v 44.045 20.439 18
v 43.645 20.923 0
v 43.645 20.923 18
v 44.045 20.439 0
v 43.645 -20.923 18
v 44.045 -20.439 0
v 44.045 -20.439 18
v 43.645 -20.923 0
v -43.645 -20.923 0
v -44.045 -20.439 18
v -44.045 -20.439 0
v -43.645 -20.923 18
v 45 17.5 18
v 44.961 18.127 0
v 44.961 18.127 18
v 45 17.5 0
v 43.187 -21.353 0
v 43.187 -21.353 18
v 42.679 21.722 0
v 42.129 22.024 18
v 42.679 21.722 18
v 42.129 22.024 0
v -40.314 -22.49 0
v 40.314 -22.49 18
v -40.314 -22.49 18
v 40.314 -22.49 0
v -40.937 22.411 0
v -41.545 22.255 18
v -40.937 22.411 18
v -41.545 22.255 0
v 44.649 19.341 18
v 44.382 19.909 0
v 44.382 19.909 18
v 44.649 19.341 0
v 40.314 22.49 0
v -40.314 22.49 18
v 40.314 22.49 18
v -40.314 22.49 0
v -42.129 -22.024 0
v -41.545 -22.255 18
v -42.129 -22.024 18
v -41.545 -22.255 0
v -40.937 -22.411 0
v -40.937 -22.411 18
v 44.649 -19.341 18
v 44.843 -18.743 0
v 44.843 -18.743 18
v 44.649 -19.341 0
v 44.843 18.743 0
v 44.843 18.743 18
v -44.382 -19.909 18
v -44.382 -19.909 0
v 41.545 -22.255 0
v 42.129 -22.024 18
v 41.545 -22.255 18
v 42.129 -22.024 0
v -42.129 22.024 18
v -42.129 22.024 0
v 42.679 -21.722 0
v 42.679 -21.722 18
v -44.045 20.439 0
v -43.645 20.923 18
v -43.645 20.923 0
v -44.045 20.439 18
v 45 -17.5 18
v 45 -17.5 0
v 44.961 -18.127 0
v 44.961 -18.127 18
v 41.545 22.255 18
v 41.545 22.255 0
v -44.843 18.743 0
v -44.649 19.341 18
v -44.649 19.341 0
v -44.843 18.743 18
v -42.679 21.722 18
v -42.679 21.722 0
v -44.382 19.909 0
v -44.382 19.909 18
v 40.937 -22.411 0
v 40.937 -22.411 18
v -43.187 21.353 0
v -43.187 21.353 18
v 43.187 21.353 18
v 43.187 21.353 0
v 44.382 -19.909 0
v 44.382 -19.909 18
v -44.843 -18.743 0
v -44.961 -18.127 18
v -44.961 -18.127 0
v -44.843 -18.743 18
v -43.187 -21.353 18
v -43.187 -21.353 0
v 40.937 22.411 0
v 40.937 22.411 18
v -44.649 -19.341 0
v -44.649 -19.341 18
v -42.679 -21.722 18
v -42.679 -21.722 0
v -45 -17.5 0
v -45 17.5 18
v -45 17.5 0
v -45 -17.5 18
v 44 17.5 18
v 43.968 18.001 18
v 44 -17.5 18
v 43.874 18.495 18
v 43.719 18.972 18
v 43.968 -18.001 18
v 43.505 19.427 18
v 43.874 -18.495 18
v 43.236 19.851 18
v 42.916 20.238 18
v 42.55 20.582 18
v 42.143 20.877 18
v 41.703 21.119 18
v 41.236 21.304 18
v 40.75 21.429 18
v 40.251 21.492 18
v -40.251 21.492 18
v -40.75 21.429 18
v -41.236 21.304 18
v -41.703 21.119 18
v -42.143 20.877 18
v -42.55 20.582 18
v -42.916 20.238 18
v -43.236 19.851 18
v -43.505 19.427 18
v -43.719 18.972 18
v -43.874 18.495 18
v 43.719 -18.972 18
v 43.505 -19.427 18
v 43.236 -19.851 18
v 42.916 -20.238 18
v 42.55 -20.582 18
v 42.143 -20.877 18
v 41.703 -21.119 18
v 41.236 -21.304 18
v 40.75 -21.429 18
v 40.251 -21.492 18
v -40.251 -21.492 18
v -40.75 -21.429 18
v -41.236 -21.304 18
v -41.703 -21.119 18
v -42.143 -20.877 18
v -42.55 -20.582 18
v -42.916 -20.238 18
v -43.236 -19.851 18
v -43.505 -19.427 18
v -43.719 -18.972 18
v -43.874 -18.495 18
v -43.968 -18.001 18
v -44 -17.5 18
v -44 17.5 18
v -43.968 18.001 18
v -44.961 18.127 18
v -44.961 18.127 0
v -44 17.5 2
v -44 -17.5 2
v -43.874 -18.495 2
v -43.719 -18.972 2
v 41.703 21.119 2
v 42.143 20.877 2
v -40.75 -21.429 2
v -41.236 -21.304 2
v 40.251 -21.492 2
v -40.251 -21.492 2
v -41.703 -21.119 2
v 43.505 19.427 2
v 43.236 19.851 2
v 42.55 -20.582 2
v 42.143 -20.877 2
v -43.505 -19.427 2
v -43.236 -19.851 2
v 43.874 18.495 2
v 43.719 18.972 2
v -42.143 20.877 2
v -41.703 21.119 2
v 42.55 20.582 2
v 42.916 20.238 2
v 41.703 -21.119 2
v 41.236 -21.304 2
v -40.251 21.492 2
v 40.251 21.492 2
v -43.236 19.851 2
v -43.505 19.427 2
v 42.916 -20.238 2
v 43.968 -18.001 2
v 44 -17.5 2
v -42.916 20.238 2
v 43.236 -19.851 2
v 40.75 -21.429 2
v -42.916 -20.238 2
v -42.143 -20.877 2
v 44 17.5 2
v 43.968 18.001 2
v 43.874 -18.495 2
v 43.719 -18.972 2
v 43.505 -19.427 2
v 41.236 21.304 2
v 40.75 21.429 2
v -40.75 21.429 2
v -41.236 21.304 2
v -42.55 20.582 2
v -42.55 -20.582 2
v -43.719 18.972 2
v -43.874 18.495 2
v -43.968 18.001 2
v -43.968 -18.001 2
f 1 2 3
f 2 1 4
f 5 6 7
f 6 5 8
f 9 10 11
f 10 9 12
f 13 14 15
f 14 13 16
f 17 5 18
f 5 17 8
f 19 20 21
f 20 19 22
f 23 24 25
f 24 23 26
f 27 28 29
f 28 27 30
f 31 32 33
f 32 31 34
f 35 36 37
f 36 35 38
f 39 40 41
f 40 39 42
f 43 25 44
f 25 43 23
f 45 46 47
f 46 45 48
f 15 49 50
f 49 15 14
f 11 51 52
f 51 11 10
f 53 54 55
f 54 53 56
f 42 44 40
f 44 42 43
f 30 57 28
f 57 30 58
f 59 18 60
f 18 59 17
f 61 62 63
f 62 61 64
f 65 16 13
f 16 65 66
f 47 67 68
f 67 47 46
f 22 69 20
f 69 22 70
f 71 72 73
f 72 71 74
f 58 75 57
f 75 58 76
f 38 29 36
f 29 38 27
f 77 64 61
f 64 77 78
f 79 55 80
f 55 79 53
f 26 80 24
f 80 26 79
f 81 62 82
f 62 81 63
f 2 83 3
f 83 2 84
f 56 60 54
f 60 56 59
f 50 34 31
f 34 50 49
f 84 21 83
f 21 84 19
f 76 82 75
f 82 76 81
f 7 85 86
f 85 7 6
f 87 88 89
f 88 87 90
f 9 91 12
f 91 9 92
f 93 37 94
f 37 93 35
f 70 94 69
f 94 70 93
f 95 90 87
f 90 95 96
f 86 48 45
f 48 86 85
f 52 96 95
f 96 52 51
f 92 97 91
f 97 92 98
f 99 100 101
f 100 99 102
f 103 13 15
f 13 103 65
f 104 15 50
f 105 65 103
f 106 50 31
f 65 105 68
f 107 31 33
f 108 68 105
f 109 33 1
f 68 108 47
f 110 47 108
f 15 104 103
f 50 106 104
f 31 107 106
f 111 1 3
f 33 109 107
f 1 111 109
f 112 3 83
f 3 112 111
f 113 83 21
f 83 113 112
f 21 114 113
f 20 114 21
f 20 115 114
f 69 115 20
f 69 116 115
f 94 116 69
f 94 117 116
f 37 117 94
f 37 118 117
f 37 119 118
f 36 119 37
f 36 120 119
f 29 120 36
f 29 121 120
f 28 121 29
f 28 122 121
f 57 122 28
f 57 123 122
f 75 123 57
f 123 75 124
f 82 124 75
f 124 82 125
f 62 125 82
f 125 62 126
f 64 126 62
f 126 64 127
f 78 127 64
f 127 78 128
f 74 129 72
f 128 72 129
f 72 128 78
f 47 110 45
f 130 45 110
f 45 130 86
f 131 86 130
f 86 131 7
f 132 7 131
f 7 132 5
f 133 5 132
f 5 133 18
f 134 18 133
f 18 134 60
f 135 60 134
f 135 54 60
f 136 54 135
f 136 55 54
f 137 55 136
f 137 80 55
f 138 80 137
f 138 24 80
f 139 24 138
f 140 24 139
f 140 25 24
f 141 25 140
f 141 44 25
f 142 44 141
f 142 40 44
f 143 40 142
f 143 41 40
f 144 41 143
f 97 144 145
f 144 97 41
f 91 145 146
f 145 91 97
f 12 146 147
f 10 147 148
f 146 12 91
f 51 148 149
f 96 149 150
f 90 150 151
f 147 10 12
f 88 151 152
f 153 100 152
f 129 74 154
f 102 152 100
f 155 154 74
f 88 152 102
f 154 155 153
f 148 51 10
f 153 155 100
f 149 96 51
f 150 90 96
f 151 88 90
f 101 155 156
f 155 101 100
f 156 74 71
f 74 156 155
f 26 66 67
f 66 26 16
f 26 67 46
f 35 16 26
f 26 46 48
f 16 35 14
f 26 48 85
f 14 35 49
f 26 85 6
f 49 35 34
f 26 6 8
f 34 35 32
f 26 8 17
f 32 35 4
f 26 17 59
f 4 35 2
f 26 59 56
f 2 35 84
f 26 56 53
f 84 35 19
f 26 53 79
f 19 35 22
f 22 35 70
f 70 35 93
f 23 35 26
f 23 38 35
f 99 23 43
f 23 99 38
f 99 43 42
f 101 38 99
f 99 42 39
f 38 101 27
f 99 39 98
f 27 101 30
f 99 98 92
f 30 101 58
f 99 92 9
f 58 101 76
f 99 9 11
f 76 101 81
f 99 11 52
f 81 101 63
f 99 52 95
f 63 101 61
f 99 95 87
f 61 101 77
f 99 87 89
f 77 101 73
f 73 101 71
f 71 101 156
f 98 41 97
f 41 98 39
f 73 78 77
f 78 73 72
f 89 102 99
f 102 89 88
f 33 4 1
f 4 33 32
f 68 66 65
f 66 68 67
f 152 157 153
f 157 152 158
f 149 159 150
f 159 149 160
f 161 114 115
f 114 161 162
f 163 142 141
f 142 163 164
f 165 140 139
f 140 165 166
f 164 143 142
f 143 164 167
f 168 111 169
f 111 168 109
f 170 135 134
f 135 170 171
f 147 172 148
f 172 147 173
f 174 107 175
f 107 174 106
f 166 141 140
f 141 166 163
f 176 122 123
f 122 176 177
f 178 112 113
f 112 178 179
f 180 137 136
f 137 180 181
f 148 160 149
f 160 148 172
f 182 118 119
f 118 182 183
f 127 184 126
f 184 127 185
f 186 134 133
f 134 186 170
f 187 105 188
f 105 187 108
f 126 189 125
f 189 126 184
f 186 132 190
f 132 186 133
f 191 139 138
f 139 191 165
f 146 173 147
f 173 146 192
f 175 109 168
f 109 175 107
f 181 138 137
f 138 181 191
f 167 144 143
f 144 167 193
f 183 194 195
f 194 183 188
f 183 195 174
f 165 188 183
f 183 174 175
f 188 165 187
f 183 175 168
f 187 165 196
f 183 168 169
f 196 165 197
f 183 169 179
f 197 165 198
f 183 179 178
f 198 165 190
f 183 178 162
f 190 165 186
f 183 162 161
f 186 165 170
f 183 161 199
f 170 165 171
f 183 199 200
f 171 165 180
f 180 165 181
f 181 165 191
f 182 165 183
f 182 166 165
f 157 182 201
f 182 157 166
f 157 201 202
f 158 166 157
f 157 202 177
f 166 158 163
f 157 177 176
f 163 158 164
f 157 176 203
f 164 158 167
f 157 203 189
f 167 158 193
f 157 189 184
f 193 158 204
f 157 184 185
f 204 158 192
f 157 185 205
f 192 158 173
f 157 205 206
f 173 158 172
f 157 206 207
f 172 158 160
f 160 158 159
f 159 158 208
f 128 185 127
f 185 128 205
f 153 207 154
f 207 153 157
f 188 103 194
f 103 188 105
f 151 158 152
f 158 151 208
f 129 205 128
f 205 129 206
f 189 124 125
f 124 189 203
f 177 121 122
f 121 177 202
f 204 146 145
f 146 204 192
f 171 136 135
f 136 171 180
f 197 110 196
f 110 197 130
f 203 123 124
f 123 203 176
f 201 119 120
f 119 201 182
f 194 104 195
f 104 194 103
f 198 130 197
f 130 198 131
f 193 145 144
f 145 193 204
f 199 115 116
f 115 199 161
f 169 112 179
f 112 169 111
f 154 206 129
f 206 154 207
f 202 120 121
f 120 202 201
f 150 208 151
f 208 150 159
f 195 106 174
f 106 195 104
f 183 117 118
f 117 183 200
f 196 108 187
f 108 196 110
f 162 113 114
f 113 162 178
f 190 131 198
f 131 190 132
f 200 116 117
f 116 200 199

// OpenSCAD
$fn = 50;


difference() {
	union() {
		hull() {
			translate(v = [-40.0000000000, 17.5000000000, 0]) {
				cylinder(h = 18, r = 5);
			}
			translate(v = [40.0000000000, 17.5000000000, 0]) {
				cylinder(h = 18, r = 5);
			}
			translate(v = [-40.0000000000, -17.5000000000, 0]) {
				cylinder(h = 18, r = 5);
			}
			translate(v = [40.0000000000, -17.5000000000, 0]) {
				cylinder(h = 18, r = 5);
			}
		}
	}
	union() {
		translate(v = [0, 0, 2]) {
			hull() {
				translate(v = [-40.0000000000, 17.5000000000, 0]) {
					cylinder(h = 16, r = 4);
				}
				translate(v = [40.0000000000, 17.5000000000, 0]) {
					cylinder(h = 16, r = 4);
				}
				translate(v = [-40.0000000000, -17.5000000000, 0]) {
					cylinder(h = 16, r = 4);
				}
				translate(v = [40.0000000000, -17.5000000000, 0]) {
					cylinder(h = 16, r = 4);
				}
			}
		}
	}
}
